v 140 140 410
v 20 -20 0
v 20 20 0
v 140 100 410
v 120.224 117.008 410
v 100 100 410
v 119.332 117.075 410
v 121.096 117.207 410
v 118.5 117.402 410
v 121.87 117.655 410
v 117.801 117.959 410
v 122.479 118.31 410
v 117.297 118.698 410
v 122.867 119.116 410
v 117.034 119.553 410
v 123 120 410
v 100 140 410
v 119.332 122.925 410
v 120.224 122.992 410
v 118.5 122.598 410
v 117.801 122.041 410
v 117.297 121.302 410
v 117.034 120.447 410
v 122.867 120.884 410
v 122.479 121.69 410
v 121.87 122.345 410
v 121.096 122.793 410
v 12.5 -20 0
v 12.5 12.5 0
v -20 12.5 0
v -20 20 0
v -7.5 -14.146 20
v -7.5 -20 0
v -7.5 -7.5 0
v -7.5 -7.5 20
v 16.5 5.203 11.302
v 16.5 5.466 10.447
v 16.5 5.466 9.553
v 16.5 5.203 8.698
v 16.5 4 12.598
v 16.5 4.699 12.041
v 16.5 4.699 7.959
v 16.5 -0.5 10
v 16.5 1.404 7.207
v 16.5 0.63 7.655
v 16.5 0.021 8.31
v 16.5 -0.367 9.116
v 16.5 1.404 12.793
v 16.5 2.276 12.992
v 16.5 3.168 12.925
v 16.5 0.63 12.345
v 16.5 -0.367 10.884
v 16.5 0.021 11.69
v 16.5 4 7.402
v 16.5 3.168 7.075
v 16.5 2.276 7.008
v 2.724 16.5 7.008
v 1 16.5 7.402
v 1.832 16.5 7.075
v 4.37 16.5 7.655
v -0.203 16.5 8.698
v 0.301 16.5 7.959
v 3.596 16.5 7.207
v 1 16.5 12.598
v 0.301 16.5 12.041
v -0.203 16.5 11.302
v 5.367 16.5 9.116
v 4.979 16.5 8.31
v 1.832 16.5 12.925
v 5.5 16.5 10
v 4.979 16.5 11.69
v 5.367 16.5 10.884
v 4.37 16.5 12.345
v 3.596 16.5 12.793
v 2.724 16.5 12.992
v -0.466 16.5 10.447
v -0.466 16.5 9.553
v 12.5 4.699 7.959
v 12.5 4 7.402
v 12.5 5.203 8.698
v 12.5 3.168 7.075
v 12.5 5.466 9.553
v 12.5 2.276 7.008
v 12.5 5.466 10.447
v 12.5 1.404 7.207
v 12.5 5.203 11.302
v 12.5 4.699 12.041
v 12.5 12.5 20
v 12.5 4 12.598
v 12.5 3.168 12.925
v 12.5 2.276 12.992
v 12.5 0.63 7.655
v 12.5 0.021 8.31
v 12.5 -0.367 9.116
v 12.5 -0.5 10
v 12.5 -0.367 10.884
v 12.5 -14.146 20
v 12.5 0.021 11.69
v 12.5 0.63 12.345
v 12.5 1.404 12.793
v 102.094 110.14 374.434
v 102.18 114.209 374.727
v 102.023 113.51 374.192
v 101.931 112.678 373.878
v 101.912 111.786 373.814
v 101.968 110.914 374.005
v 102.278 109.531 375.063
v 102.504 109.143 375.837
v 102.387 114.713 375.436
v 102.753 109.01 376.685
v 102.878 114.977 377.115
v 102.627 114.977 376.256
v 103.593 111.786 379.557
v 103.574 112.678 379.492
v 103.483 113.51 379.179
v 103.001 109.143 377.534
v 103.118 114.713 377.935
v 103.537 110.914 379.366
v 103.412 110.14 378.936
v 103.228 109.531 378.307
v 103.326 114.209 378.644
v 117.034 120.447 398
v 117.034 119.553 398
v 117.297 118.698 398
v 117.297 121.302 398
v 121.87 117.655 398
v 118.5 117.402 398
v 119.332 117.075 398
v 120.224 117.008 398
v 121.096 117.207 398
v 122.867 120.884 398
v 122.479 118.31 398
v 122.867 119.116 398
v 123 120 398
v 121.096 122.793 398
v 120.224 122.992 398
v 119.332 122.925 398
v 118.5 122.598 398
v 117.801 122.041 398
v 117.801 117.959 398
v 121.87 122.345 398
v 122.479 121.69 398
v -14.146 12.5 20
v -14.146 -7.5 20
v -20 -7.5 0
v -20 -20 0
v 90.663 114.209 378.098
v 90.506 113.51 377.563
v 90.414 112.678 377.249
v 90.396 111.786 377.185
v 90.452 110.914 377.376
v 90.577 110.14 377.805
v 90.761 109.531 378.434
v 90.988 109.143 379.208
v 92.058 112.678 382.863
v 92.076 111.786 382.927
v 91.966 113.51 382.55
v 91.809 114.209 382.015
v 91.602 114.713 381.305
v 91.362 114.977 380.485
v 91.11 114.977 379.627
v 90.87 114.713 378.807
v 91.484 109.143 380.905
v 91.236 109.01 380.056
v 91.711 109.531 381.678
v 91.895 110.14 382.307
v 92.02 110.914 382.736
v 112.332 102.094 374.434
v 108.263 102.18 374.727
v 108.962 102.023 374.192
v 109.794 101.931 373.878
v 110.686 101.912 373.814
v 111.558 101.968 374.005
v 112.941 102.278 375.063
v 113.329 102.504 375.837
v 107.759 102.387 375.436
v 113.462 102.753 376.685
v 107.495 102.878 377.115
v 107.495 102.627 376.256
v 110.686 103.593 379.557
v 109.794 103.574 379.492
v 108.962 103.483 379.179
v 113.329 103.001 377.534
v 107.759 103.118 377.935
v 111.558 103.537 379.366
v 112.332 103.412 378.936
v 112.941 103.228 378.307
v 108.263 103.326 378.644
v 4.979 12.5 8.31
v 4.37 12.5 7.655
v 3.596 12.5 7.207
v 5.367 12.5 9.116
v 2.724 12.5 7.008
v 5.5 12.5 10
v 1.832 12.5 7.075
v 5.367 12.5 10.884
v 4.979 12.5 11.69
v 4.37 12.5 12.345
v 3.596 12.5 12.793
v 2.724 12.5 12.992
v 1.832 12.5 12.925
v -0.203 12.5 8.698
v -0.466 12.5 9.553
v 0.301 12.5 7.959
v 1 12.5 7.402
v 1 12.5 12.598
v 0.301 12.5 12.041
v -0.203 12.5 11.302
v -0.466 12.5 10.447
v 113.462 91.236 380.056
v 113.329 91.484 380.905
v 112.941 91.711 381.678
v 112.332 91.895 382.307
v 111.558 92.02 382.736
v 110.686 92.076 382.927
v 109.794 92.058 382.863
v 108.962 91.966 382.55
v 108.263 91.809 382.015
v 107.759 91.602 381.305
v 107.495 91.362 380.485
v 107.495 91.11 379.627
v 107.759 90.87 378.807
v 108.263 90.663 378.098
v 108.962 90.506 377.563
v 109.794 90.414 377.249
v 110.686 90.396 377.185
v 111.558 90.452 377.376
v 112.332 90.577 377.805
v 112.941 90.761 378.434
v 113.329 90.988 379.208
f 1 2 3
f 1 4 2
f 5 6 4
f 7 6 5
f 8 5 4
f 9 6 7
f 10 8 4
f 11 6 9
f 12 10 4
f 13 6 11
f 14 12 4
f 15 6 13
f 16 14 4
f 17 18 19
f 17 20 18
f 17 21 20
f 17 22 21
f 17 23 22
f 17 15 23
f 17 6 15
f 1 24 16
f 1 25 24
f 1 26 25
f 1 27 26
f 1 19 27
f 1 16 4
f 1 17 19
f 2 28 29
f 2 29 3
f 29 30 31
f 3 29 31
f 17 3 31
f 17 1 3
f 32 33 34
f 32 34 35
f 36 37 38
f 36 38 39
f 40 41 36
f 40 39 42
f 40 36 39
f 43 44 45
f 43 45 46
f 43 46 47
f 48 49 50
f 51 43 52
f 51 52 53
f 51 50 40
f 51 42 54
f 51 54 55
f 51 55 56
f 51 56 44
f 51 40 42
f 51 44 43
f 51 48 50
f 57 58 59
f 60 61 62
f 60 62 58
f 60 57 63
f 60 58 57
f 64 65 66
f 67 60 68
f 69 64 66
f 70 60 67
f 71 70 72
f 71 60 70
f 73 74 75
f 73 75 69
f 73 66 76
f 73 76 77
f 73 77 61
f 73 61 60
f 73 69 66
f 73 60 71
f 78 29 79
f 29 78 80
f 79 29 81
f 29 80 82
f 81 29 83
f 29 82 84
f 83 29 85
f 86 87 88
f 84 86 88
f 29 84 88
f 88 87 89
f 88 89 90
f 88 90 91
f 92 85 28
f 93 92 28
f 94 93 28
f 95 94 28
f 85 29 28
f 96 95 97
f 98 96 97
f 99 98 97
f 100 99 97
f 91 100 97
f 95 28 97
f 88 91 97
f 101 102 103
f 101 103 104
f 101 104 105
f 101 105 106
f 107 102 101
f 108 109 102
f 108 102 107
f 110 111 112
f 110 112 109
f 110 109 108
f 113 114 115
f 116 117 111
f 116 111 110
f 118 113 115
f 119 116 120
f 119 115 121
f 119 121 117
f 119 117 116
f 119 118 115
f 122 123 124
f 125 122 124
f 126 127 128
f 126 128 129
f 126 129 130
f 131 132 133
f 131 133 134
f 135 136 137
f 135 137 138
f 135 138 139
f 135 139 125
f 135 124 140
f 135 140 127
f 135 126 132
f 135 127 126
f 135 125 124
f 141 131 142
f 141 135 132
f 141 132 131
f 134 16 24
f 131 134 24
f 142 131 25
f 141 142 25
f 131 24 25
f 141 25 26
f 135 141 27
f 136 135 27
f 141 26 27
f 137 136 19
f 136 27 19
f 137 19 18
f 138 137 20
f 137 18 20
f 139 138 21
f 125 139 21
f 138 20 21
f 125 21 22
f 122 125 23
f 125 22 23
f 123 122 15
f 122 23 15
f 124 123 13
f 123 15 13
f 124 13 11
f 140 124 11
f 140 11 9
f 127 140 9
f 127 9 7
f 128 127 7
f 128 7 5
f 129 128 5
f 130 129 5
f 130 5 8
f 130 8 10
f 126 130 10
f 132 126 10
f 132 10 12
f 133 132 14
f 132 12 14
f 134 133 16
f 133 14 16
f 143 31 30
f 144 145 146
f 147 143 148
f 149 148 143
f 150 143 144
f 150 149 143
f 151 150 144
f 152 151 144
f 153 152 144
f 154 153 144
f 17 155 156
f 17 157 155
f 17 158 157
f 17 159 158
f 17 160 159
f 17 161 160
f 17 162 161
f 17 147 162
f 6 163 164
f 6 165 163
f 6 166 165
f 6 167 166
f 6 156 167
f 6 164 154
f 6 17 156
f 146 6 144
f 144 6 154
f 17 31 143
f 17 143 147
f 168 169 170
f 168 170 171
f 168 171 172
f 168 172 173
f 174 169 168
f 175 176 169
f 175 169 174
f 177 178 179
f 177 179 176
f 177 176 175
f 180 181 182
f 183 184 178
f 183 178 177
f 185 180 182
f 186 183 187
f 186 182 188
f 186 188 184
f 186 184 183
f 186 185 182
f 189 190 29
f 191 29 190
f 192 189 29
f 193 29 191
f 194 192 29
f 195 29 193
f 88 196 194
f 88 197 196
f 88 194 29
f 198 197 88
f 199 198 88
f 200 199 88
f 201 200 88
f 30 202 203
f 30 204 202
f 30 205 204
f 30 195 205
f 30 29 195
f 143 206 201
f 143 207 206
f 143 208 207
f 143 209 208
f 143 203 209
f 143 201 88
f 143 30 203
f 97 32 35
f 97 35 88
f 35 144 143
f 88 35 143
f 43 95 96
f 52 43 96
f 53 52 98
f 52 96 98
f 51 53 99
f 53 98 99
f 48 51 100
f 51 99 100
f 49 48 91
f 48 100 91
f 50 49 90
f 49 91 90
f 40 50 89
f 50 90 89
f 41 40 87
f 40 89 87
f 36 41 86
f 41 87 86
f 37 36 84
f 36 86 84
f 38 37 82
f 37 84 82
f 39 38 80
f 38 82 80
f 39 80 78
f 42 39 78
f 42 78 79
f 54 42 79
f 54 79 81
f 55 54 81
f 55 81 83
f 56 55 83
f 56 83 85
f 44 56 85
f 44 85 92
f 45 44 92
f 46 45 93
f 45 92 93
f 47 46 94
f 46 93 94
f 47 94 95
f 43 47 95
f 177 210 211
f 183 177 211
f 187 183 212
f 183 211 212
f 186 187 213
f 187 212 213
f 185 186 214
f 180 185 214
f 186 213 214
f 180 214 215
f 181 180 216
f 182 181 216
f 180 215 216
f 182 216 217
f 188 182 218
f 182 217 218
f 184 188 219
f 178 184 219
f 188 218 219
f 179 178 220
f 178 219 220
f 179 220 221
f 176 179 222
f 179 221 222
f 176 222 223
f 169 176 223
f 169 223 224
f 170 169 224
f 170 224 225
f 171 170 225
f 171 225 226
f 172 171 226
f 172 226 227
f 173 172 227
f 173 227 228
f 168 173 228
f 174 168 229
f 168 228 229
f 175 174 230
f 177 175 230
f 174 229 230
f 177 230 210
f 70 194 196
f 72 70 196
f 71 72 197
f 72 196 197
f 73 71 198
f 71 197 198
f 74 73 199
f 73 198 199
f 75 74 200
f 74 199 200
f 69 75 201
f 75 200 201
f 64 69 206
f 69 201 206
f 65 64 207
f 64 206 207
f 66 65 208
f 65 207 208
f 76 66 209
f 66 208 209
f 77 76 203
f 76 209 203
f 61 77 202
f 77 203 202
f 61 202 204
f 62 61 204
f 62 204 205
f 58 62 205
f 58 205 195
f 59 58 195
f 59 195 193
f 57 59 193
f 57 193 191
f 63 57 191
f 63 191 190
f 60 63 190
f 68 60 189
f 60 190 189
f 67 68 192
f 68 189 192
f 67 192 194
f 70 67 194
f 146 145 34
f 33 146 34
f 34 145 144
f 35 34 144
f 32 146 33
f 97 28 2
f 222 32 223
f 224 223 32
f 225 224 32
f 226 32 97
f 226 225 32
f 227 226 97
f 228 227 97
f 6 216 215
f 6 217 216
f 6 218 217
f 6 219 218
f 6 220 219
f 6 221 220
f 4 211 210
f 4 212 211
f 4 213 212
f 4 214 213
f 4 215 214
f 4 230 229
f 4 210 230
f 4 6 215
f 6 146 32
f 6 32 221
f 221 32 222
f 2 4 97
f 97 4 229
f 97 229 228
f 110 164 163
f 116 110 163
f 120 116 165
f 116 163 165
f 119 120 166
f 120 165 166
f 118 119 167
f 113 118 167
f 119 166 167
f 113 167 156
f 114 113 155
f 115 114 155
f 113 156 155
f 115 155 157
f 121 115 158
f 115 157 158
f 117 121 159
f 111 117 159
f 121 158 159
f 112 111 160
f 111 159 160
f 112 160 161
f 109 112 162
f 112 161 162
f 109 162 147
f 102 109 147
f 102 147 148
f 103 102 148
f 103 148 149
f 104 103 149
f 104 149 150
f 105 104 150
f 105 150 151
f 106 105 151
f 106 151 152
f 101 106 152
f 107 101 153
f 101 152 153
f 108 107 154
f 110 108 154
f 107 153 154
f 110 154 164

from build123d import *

# Parameters (mm, degrees)
F0_W      = 40
F0_H      = 40
F2_W      = 40
F2_H      = 40
F4_R      = 3
F5_DEPTH  = 12
F6_R      = 3
F7_DEPTH  = 12
F8_R      = 3
F9_DEPTH  = 12
F11_W     = 20
F11_H     = 20
F12_DEPTH = 32.5
F14_W     = 20
F14_H     = 20
F15_DEPTH = 32.5
F16_R     = 3
F17_DEPTH = 4
F18_R     = 3
F19_DEPTH = 4


with BuildPart() as f3:
    # F0 (on Top) → F3 section 0
    with BuildSketch(Plane.XY):
        Rectangle(F0_W, F0_H)
    # F2 (on offset) → F3 section 1
    with BuildSketch(Plane.XY.offset(410)):
        with Locations((120, 120)):
            Rectangle(F2_W, F2_H)
    loft()

    # F4 (on face) → F5 (cut)
    with BuildSketch(Plane(origin=(-18.4219178082, 0, 5.3917808219), x_dir=(0, -1, 0), z_dir=(-0.959737407, 0, 0.2808987533))):
        with Locations((-112.0100207019, 390.3822122005)):
            Circle(F4_R)
    extrude(amount=-F5_DEPTH, mode=Mode.SUBTRACT)

    # F6 (on face) → F7 (cut)
    with BuildSketch(Plane(origin=(0, -18.4219178082, 5.3917808219), x_dir=(1, 0, 0), z_dir=(0, -0.959737407, 0.2808987533))):
        with Locations((110.461897094, 390.3822122005)):
            Circle(F6_R)
    extrude(amount=-F7_DEPTH, mode=Mode.SUBTRACT)

    # F8 (on face) → F9 (cut)
    with BuildSketch(Plane.XY.offset(410)):
        with Locations((120, 120)):
            Circle(F8_R)
    extrude(amount=-F9_DEPTH, mode=Mode.SUBTRACT)

    # F11 (on offset) → F12 (cut)
    with BuildSketch(Plane.YZ.offset(-20)):
        with Locations((2.5, 10)):
            Rectangle(F11_W, F11_H)
    extrude(amount=F12_DEPTH, mode=Mode.SUBTRACT)

    # F14 (on offset) → F15 (cut)
    with BuildSketch(Plane.XZ.offset(20)):
        with Locations((2.5, 10)):
            Rectangle(F14_W, F14_H)
    extrude(amount=-F15_DEPTH, mode=Mode.SUBTRACT)

    # F16 (on face) → F17 (cut)
    with BuildSketch(Plane.XZ.offset(-12.5)):
        with Locations((2.5, 10)):
            Circle(F16_R)
    extrude(amount=-F17_DEPTH, mode=Mode.SUBTRACT)

    # F18 (on face) → F19 (cut)
    with BuildSketch(Plane(origin=(12.5, 0, 0), x_dir=(0, -1, 0), z_dir=(-1, 0, 0))):
        with Locations((-2.5, 10)):
            Circle(F18_R)
    extrude(amount=-F19_DEPTH, mode=Mode.SUBTRACT)


solid = f3.part
